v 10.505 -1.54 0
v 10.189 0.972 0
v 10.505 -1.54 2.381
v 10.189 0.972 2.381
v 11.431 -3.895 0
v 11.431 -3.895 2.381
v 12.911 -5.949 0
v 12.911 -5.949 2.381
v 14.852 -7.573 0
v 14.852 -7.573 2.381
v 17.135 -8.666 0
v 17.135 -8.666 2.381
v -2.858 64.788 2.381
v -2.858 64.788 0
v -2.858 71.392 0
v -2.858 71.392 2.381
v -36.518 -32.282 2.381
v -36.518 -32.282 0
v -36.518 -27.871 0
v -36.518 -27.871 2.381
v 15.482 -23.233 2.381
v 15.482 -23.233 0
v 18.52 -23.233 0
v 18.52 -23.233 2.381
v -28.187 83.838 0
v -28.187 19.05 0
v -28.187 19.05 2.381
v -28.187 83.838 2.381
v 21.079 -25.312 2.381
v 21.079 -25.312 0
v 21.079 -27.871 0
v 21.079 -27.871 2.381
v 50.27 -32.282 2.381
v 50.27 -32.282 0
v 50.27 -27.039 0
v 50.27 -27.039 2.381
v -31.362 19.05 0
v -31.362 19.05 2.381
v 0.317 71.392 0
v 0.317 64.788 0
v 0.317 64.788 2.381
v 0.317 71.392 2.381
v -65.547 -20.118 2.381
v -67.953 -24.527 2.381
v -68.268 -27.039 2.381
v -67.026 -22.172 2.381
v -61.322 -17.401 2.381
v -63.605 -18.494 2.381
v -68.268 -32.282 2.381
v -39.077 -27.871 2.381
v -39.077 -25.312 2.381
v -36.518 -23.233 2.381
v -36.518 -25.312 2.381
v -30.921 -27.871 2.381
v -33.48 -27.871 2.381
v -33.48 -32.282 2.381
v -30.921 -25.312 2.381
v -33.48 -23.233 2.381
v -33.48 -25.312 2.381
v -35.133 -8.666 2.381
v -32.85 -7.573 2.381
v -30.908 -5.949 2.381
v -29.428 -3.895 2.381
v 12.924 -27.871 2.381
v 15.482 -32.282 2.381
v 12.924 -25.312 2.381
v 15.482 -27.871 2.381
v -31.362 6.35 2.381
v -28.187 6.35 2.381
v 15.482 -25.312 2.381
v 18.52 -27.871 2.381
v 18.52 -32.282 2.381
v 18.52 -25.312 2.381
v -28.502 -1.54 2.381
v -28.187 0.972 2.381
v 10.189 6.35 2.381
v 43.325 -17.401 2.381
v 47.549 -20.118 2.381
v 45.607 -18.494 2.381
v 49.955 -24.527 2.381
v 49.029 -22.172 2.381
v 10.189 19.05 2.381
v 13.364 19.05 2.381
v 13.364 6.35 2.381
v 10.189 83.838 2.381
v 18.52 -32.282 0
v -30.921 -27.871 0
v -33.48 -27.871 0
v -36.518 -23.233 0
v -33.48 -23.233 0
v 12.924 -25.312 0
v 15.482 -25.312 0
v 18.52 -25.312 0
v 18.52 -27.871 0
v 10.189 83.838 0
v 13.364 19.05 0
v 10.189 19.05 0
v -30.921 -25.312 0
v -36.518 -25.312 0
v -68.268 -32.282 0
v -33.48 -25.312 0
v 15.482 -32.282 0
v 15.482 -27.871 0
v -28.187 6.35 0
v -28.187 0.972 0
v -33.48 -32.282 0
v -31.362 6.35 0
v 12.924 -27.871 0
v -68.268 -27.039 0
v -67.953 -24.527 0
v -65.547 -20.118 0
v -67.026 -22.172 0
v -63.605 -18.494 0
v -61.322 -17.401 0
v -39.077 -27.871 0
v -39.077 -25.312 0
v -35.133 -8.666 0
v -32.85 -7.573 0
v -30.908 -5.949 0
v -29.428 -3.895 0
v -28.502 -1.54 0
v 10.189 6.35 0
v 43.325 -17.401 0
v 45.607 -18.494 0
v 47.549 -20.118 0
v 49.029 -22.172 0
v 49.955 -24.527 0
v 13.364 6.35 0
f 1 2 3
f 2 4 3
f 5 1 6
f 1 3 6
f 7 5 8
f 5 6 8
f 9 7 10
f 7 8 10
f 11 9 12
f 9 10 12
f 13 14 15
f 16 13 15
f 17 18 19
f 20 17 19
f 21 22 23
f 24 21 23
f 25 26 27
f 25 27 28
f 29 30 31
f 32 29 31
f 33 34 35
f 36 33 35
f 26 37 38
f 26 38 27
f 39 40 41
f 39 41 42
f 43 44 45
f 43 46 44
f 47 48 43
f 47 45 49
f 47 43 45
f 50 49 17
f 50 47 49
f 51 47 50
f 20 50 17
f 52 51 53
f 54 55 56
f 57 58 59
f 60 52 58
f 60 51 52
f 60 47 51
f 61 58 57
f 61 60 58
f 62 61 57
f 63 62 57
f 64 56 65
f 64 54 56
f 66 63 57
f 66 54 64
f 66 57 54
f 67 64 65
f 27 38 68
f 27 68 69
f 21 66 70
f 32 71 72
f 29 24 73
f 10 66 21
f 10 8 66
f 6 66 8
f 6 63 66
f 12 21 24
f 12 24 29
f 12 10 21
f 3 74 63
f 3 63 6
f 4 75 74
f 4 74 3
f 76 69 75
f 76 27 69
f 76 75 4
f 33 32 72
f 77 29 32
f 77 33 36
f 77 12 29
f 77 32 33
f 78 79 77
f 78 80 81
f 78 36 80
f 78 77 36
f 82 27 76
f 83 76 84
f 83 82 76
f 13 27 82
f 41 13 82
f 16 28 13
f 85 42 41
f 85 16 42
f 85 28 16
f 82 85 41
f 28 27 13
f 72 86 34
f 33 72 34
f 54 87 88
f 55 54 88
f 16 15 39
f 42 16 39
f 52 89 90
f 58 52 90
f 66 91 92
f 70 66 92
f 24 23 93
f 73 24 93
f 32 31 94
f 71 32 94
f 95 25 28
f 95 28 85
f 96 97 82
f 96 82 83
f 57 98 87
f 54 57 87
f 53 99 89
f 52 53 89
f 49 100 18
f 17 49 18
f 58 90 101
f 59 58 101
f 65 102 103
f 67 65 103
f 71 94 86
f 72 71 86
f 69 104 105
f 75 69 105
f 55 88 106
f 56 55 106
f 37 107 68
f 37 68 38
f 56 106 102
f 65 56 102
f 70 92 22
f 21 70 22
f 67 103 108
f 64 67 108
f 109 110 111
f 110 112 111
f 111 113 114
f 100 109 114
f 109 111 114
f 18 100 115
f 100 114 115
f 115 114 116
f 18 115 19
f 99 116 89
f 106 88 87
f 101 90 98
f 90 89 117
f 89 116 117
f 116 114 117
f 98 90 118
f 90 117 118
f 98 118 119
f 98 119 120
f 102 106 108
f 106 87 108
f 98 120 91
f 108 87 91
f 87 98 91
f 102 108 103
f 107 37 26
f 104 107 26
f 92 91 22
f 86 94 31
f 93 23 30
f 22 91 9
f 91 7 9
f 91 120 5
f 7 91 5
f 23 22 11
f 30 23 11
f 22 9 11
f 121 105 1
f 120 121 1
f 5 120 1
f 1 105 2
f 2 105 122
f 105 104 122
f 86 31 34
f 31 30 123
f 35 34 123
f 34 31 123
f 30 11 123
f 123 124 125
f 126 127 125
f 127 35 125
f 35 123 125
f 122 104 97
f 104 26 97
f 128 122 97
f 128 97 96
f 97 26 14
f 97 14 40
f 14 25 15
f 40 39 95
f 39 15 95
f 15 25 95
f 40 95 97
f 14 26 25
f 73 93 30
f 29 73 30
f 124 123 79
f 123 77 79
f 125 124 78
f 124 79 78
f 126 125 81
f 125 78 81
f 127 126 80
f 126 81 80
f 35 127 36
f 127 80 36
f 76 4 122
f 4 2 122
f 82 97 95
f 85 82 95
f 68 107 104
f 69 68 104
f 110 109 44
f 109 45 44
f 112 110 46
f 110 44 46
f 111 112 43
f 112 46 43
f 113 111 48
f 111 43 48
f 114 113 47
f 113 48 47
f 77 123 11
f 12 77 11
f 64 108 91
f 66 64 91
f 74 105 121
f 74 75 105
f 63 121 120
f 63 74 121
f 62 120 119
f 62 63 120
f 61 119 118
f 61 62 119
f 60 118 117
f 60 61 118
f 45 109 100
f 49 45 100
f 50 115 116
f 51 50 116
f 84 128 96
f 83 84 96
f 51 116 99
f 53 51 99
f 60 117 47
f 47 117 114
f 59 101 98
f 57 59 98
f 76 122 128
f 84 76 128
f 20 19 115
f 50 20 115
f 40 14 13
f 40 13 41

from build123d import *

# Parameters (mm, degrees)
SKETCH1_W           = 15.875
SKETCH1_H           = 83.83778
SKETCH1_W_2         = 3.175
SKETCH1_H_2         = 6.604
BOSS_EXTRUDE1_DEPTH = 2.38125
SKETCH2_W           = 5.42671
SKETCH2_H           = 83.83778
SKETCH2_W_2         = 23.424388
BOSS_EXTRUDE2_DEPTH = 2.38125
SKETCH3_W           = 3.175
SKETCH3_H           = 64.78778
SKETCH3_H_2         = 6.35
CUT_EXTRUDE2_DEPTH  = 90.543351098
BOSS_EXTRUDE4_DEPTH = 2.38125
FILLET1_R           = 10.16
CUT_EXTRUDE5_DEPTH  = 109.143259408


with BuildPart() as part:
    # Sketch1 → Boss-Extrude1 (new body)
    with BuildSketch(Plane.XY):
        with Locations((0, 41.91889)):
            Rectangle(SKETCH1_W, SKETCH1_H)
        with Locations((-1.27, 68.08976095)):
            Rectangle(SKETCH1_W_2, SKETCH1_H_2, mode=Mode.SUBTRACT)
    extrude(amount=BOSS_EXTRUDE1_DEPTH)

    # Sketch2 → Boss-Extrude2 (add)
    with BuildSketch(Plane.XY):
        with Locations((10.650855, 41.91889)):
            Rectangle(SKETCH2_W, SKETCH2_H)
        with Locations((-19.649694, 41.91889)):
            Rectangle(SKETCH2_W_2, SKETCH2_H)
    extrude(amount=BOSS_EXTRUDE2_DEPTH)

    # Sketch3 → Cut-Extrude2 (cut, through all)
    with BuildSketch(Plane.XY):
        with Locations((-29.774388, 51.44389)):
            Rectangle(SKETCH3_W, SKETCH3_H)
        with Locations((11.77671, 51.44389)):
            Rectangle(SKETCH3_W, SKETCH3_H)
        with Locations((-29.774388, 3.175)):
            Rectangle(SKETCH3_W, SKETCH3_H_2)
        with Locations((11.77671, 3.175)):
            Rectangle(SKETCH3_W, SKETCH3_H_2)
    extrude(amount=CUT_EXTRUDE2_DEPTH, mode=Mode.SUBTRACT)

    # Sketch5 → Boss-Extrude4 (add)
    with BuildSketch(Plane.XY):
        Polygon((-28.186888, 0), (-28.186888, -6.35), (-68.268007503, -19.717143922), (-68.268007503, -32.282068045), (50.270329503, -32.282068045), (50.270329503, -19.717143922), (10.18921, -6.35), (10.18921, 0), align=None)
    extrude(amount=BOSS_EXTRUDE4_DEPTH)

    # Fillet1
    fillet1_edges = [part.edges().sort_by_distance(p)[0] for p in [
        (-28.186888, -6.35, 1.190625),
        (-68.268007503, -19.717143922, 1.190625),
        (50.270329503, -19.717143922, 1.190625),
        (10.18921, -6.35, 1.190625),
    ]]
    fillet(fillet1_edges, radius=FILLET1_R)

    # Sketch6 → Cut-Extrude5 (cut, through all)
    with BuildSketch(Plane.XY):
        Polygon((-36.518007503, -32.282068045), (-36.518007503, -27.870697677), (-39.076507827, -27.870697677), (-39.076507827, -25.312197354), (-36.518007503, -25.312197354), (-36.518007503, -23.233415841), (-33.479788369, -23.233415841), (-33.479788369, -25.312197354), (-30.921288046, -25.312197354), (-30.921288046, -27.870697677), (-33.479788369, -27.870697677), (-33.479788369, -32.282068045), align=None)
        Polygon((15.482110369, -32.282068045), (15.482110369, -27.870697677), (12.923610046, -27.870697677), (12.923610046, -25.312197354), (15.482110369, -25.312197354), (15.482110369, -23.233415841), (18.520329503, -23.233415841), (18.520329503, -25.312197354), (21.078829827, -25.312197354), (21.078829827, -27.870697677), (18.520329503, -27.870697677), (18.520329503, -32.282068045), align=None)
    extrude(amount=CUT_EXTRUDE5_DEPTH, mode=Mode.SUBTRACT)


solid = part.part
